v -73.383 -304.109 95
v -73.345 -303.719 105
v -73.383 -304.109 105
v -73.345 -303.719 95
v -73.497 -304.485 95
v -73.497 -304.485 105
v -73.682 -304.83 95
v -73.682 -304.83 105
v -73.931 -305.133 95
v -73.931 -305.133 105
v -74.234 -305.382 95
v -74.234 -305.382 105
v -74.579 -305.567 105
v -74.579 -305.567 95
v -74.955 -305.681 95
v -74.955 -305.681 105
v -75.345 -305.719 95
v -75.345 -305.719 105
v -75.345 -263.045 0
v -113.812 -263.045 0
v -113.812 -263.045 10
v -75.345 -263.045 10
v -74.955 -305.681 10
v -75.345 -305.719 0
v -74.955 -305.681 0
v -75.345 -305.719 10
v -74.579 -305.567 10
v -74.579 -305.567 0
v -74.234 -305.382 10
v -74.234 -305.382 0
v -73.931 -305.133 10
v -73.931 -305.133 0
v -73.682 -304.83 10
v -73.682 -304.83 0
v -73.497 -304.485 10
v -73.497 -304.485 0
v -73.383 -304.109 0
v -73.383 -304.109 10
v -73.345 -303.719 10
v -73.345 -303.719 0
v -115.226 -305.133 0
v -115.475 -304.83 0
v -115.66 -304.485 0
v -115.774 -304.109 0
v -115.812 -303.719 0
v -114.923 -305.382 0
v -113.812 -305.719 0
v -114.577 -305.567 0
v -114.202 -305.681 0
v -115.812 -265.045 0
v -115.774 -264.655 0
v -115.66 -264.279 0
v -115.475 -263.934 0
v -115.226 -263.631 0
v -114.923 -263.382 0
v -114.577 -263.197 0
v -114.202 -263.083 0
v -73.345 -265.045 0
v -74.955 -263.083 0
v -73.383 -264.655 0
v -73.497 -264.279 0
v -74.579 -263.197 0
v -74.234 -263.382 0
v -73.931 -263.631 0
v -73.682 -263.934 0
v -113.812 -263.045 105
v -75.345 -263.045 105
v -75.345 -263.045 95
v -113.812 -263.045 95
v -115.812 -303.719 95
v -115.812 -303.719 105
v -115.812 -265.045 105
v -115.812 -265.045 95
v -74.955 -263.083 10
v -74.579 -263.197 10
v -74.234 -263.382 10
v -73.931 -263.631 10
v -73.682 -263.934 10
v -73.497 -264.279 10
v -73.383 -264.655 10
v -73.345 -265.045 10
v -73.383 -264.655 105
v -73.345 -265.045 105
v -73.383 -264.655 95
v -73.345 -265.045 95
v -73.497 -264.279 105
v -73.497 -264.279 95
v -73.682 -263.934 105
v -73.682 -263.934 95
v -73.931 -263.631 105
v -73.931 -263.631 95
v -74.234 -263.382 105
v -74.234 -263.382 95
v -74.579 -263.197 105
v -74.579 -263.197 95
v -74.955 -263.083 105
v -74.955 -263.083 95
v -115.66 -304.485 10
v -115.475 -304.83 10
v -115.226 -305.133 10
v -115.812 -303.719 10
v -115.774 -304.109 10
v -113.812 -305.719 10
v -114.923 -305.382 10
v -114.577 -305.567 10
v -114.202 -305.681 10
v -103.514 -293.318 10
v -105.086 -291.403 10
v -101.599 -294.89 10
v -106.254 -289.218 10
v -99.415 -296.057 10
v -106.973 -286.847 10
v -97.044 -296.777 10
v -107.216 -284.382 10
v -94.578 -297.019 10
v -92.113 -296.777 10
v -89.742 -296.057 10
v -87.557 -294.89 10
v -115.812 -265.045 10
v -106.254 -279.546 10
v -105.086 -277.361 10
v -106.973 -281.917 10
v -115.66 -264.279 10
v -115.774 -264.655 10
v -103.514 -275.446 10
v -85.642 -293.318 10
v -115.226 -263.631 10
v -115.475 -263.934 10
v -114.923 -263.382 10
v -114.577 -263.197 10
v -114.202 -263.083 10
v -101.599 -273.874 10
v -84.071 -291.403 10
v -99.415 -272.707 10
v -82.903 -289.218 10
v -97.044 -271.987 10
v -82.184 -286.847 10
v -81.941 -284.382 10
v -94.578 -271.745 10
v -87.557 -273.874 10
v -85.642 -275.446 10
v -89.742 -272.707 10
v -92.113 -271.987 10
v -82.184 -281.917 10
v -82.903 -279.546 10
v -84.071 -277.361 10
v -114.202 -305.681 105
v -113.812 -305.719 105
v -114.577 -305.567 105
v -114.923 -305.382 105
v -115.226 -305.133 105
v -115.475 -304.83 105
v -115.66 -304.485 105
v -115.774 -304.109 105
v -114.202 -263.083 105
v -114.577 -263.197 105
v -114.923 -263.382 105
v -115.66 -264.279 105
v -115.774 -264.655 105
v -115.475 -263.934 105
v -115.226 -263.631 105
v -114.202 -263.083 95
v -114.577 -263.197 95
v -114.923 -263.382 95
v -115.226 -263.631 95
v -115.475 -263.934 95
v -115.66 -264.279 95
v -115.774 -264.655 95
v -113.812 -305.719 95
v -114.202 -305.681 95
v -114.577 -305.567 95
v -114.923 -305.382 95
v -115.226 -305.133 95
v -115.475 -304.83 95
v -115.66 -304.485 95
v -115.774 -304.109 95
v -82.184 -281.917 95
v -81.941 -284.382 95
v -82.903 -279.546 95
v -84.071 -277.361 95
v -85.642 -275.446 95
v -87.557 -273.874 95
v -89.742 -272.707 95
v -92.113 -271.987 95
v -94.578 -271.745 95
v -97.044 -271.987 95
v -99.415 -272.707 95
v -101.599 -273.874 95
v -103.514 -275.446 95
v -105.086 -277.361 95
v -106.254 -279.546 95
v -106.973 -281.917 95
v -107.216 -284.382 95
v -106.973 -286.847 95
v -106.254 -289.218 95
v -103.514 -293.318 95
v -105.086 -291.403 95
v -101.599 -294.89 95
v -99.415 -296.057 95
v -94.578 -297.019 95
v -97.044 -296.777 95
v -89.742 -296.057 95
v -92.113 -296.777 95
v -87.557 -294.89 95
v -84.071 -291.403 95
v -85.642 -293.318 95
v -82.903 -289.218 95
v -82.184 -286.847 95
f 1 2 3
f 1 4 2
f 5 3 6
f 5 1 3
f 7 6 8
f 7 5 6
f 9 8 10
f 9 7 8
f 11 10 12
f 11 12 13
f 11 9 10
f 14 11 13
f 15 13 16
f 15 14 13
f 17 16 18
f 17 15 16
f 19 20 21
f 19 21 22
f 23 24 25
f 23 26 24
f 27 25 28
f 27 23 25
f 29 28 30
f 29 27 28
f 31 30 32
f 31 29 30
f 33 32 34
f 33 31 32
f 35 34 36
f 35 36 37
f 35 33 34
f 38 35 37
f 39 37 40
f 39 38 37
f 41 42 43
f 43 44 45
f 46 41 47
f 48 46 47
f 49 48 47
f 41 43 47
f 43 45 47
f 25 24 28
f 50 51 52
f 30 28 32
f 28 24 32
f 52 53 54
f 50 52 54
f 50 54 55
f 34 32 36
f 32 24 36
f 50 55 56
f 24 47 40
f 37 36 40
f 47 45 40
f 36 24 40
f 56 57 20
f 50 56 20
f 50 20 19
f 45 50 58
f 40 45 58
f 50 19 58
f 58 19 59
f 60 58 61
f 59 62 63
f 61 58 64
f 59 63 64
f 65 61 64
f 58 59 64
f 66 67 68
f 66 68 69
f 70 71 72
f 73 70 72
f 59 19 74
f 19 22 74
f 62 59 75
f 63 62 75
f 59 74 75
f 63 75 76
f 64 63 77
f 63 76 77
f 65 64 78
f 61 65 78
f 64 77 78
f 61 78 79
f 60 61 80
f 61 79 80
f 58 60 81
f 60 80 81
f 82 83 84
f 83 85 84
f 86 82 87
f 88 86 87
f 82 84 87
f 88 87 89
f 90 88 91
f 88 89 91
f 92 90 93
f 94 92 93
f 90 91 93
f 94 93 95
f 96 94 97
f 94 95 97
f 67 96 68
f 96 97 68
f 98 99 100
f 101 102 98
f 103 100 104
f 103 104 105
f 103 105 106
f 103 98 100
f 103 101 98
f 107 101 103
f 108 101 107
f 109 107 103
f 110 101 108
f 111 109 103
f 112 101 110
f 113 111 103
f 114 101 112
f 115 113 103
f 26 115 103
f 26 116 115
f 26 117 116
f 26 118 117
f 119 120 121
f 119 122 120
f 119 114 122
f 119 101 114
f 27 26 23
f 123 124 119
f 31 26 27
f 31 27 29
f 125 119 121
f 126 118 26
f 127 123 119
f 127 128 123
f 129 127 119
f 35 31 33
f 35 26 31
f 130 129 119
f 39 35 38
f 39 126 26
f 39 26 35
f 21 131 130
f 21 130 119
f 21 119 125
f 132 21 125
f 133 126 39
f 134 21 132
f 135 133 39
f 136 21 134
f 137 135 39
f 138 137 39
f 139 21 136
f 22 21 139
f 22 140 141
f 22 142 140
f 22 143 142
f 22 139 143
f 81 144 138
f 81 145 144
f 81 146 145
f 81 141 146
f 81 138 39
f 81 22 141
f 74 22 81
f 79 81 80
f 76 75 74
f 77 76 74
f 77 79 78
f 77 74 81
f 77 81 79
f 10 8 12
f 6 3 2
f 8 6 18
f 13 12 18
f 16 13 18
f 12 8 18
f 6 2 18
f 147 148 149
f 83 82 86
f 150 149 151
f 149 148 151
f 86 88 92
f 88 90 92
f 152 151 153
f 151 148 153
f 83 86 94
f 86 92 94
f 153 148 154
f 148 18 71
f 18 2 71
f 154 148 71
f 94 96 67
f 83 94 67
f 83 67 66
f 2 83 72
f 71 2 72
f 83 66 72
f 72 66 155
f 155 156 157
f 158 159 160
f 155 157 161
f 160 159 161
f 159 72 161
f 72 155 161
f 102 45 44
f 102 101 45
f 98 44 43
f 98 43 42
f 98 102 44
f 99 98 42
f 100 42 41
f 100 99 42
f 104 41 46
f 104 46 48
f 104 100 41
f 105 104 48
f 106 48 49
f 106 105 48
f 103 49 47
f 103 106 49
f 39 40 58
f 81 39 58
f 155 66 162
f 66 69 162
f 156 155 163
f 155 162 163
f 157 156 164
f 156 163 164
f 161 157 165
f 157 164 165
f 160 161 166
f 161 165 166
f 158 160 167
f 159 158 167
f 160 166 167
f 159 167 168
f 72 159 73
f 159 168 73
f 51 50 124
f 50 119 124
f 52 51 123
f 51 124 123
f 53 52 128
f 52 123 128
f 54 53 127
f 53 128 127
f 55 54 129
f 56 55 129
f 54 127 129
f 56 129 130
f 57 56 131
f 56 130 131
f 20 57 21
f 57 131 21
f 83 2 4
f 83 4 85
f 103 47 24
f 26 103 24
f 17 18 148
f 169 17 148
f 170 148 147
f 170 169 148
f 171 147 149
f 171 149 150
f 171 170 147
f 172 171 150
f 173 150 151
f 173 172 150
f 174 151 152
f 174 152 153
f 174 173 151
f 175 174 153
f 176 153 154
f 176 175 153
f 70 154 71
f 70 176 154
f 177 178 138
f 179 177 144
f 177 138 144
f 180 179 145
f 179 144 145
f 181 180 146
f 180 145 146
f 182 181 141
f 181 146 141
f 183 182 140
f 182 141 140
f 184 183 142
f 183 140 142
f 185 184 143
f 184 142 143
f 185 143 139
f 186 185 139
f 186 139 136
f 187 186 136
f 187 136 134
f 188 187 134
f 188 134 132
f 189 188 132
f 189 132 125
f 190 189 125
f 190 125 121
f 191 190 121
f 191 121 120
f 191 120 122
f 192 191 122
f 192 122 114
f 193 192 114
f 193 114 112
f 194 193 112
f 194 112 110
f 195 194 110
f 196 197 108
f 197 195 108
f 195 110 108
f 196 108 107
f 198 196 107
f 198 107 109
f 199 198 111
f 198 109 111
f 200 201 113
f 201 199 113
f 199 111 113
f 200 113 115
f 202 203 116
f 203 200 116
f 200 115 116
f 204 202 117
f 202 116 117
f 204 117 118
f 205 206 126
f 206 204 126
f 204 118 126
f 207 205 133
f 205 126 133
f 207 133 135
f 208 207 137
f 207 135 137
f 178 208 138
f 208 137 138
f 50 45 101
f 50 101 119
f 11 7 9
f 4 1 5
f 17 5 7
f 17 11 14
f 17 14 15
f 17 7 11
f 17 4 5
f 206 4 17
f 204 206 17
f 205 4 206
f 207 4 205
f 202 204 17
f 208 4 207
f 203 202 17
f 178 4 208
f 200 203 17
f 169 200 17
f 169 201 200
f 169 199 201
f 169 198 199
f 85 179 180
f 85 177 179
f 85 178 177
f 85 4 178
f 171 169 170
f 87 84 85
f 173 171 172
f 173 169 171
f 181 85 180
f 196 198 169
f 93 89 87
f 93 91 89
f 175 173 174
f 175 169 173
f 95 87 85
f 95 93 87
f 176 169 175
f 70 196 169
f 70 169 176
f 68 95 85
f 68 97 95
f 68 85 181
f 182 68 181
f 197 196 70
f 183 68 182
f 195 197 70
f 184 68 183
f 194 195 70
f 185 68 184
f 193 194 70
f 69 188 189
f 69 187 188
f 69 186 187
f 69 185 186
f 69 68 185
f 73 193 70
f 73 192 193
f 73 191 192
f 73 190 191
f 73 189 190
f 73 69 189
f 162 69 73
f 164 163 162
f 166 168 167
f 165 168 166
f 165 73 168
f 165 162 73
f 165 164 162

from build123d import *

# Parameters (mm, degrees)
SKETCH1_W           = 42.467218632
SKETCH1_H           = 42.674431579
BOSS_EXTRUDE1_DEPTH = 10
SKETCH2_R           = 12.637375282
BOSS_EXTRUDE2_DEPTH = 89
SKETCH4_W           = 42.467218632
SKETCH4_H           = 42.674431579
BOSS_EXTRUDE3_DEPTH = 10
FILLET1_R           = 2


with BuildPart() as part:
    # Sketch1 → Boss-Extrude1 (new body)
    with BuildSketch(Plane.XY):
        with Locations((-94.578448042, -284.38200622)):
            Rectangle(SKETCH1_W, SKETCH1_H)
    extrude(amount=BOSS_EXTRUDE1_DEPTH)

    # Sketch2 → Boss-Extrude2 (add)
    with BuildSketch(Plane.XY.offset(10)):
        with Locations((-94.578448042, -284.38200622)):
            Circle(SKETCH2_R)
    extrude(amount=BOSS_EXTRUDE2_DEPTH)

    # Sketch4 → Boss-Extrude3 (add)
    with BuildSketch(Plane(origin=(0, 0, 105), x_dir=(-1, 0, 0), z_dir=(0, 0, -1))):
        with Locations((94.578448042, -284.38200622)):
            Rectangle(SKETCH4_W, SKETCH4_H)
    extrude(amount=BOSS_EXTRUDE3_DEPTH)

    # Fillet1
    fillet1_edges = [part.edges().sort_by_distance(p)[0] for p in [
        (-73.344838726, -263.044790431, 100),
        (-73.344838726, -305.71922201, 100),
        (-115.812057358, -305.71922201, 100),
        (-115.812057358, -263.044790431, 100),
        (-73.344838726, -305.71922201, 5),
        (-115.812057358, -305.71922201, 5),
        (-115.812057358, -263.044790431, 5),
        (-73.344838726, -263.044790431, 5),
    ]]
    fillet(fillet1_edges, radius=FILLET1_R)


solid = part.part
